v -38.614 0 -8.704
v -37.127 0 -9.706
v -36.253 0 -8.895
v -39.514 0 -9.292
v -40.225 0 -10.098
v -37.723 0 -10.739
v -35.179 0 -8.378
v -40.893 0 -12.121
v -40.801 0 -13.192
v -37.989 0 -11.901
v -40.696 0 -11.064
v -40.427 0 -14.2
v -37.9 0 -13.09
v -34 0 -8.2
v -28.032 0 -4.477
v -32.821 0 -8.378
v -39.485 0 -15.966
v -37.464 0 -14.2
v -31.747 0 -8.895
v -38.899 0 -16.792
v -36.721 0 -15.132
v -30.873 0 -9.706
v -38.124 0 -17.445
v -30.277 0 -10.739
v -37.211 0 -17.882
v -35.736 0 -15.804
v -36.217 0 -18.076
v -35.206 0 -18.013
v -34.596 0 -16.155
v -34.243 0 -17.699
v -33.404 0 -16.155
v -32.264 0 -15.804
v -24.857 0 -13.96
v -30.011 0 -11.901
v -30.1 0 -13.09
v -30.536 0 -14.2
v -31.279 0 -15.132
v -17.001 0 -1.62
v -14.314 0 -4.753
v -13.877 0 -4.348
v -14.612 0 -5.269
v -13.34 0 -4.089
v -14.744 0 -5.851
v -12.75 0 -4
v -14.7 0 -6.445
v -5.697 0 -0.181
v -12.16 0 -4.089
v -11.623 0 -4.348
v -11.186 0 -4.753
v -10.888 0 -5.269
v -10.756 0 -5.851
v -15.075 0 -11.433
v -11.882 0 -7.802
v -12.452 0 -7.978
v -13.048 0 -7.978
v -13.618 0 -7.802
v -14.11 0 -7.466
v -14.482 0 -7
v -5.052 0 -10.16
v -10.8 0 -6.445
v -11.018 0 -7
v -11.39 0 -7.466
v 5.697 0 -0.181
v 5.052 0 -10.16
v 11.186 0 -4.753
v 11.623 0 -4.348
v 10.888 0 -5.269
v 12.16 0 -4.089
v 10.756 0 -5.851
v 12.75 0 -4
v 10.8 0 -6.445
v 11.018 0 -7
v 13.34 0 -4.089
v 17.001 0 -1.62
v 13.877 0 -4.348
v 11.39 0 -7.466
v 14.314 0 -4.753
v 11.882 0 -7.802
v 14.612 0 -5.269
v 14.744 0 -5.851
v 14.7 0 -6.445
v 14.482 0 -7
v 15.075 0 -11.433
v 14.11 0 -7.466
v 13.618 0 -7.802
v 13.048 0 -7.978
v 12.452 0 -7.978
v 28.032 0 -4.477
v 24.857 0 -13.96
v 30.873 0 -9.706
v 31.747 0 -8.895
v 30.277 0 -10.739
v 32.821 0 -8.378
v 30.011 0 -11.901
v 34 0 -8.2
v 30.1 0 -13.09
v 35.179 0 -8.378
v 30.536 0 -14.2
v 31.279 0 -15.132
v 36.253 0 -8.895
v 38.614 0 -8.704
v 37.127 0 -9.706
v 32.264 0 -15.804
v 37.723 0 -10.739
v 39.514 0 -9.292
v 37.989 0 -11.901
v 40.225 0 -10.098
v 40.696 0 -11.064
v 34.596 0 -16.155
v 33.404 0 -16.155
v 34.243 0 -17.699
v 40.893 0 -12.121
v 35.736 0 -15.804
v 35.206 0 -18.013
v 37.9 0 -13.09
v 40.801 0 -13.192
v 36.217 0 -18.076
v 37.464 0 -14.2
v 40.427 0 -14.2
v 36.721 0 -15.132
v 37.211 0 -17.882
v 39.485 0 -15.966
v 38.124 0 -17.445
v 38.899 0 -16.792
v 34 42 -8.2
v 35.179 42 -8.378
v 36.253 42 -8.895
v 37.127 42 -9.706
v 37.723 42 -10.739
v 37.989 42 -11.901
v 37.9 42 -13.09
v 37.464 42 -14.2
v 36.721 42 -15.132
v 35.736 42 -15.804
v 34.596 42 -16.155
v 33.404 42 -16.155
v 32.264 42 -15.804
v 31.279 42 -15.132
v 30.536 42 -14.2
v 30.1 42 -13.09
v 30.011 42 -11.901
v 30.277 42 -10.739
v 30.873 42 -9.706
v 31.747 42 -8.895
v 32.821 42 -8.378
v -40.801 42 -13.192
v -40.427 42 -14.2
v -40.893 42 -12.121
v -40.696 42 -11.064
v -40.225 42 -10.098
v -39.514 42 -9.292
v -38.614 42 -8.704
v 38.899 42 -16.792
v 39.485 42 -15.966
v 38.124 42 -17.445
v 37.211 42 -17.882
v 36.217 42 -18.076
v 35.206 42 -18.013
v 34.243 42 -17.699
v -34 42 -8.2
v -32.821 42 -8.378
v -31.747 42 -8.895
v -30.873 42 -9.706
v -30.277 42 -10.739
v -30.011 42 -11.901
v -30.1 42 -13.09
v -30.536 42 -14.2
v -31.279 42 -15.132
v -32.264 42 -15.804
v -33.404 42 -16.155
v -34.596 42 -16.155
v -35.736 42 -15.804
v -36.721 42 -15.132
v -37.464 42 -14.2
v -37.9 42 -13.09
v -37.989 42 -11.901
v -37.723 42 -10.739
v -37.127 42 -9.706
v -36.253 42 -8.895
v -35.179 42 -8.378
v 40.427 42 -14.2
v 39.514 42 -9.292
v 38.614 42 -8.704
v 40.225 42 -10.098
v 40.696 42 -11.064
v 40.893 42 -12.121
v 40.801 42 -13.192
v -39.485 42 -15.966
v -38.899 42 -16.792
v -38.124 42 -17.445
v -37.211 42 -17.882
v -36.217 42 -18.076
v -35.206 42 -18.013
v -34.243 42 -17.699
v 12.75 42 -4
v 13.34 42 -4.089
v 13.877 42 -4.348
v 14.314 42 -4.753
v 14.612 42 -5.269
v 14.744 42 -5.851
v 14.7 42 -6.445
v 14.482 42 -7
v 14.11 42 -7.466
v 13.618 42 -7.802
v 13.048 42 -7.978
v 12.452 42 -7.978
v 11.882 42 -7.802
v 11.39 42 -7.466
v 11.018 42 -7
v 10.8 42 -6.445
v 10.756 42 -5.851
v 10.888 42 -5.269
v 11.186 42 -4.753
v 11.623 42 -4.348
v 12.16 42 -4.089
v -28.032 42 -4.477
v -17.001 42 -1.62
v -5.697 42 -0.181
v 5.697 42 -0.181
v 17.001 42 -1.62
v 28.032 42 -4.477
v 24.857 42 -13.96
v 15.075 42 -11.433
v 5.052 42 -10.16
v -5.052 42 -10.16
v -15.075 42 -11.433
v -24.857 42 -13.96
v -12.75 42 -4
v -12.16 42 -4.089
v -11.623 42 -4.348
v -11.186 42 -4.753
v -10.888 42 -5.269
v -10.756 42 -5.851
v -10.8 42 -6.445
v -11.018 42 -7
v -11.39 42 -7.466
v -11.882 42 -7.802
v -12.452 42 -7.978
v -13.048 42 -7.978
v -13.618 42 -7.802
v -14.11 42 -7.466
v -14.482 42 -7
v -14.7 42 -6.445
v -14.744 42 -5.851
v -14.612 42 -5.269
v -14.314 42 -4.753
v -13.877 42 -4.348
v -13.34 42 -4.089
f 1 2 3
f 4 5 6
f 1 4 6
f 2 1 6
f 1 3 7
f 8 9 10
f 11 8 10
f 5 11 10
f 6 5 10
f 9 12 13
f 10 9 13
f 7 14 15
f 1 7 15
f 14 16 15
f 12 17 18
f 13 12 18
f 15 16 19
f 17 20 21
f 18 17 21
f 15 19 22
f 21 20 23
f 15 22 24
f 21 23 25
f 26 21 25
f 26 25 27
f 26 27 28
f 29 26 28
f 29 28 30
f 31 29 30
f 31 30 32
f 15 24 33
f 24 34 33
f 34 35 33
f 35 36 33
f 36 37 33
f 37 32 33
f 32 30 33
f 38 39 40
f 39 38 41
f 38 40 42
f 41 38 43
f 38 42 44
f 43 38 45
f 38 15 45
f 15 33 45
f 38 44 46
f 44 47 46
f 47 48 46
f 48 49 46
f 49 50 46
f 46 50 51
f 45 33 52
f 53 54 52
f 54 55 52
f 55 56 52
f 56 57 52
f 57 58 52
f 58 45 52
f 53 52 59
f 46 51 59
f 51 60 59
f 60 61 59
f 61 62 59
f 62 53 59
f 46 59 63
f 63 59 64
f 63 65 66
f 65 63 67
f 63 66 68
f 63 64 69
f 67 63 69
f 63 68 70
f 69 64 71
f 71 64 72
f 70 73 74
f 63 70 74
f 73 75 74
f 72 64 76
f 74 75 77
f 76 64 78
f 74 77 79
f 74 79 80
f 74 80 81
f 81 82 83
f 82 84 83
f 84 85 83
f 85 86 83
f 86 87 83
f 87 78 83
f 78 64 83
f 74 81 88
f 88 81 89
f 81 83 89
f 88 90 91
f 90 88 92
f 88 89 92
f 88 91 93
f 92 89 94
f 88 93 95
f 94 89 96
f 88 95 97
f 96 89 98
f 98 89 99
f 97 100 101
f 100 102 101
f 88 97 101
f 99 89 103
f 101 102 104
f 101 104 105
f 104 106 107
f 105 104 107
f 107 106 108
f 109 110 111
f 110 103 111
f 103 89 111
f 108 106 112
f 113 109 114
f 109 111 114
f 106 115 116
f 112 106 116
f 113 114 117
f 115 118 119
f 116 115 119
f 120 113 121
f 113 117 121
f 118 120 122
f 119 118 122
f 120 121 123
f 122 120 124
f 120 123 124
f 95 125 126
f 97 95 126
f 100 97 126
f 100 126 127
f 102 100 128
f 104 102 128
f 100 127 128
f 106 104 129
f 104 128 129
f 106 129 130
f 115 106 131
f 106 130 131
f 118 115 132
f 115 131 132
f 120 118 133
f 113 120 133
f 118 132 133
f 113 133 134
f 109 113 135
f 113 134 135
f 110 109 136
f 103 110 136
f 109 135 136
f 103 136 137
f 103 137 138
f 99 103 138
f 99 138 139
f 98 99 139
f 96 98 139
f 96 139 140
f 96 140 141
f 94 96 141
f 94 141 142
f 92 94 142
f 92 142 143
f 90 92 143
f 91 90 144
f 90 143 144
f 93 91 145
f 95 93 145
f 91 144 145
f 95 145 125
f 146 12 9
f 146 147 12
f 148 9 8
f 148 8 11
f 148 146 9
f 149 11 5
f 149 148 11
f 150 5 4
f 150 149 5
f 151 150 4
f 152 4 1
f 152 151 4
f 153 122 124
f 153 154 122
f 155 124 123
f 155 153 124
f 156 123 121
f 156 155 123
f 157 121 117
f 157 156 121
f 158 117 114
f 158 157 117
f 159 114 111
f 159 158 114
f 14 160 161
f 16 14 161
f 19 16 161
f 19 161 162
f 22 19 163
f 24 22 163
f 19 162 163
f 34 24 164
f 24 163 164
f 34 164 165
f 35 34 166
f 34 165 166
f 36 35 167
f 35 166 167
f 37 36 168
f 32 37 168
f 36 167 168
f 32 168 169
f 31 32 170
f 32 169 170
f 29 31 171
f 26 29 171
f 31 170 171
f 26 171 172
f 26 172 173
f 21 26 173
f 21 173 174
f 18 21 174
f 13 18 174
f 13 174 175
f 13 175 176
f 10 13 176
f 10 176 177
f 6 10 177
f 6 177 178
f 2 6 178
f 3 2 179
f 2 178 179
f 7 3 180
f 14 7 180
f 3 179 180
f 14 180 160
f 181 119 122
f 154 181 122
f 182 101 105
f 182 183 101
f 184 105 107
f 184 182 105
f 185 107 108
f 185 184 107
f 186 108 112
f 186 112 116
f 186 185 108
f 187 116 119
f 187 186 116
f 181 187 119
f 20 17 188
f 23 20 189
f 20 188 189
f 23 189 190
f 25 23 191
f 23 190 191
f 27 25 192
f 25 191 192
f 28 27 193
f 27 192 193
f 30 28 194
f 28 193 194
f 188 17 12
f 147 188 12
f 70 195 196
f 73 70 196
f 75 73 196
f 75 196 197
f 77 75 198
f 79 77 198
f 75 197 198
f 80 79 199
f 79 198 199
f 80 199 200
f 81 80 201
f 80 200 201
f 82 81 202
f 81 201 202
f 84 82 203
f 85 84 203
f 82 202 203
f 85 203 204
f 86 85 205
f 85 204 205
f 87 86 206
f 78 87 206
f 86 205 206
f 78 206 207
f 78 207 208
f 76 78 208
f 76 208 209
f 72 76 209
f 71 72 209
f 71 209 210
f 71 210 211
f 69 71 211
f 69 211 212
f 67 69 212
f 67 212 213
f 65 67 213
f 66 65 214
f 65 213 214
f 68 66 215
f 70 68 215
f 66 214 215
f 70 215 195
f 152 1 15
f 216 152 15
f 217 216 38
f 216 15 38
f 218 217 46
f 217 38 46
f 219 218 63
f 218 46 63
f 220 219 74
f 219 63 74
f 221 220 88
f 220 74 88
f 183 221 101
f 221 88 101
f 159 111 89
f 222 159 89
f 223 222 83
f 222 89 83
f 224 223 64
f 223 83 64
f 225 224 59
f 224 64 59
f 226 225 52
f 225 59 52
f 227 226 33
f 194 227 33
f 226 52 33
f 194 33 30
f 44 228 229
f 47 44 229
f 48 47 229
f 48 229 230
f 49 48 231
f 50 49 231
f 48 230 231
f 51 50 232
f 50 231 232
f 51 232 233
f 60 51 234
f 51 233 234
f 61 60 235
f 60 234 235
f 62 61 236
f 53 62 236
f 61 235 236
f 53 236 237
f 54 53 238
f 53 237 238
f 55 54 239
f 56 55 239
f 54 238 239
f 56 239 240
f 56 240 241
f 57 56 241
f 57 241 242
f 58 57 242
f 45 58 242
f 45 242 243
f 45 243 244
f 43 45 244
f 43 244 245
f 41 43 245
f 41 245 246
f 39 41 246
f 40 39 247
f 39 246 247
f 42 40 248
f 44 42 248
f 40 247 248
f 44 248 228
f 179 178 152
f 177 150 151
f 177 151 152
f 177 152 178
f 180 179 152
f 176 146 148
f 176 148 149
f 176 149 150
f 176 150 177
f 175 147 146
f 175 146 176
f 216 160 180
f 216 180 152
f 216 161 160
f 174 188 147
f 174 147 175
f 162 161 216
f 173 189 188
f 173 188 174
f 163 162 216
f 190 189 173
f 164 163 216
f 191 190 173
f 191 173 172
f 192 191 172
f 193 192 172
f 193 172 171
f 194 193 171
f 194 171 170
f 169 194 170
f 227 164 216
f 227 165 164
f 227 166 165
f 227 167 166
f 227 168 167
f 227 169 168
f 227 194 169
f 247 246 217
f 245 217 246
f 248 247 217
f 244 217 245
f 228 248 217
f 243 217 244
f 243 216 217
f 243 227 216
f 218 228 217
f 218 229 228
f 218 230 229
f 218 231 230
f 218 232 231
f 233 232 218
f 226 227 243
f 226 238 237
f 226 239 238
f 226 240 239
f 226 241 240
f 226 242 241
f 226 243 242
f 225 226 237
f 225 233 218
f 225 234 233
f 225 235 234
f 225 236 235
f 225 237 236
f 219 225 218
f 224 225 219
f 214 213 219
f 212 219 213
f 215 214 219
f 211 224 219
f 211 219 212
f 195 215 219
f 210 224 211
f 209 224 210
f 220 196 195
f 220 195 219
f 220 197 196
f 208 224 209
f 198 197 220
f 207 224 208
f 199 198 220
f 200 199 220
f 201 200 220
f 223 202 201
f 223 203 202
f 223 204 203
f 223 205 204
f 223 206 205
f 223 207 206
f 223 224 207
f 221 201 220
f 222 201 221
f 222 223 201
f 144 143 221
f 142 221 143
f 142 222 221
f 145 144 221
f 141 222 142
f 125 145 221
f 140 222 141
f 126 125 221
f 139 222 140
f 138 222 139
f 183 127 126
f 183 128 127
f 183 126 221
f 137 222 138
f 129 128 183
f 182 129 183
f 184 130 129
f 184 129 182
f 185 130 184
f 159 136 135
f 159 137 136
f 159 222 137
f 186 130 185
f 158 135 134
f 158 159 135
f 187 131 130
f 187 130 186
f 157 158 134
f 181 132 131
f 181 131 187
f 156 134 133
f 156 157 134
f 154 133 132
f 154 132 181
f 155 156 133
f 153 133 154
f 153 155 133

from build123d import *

# Parameters (mm, degrees)
BOSS_EXTRUDE1_DEPTH = 42
FILLET1_R           = 4
SKETCH2_R           = 4
CUT_EXTRUDE1_DEPTH  = 42
SKETCH3_R           = 2
CUT_EXTRUDE2_DEPTH  = 42


with BuildPart() as part:
    # Sketch1 → Boss-Extrude1 (new body)
    with BuildSketch(Plane(origin=(0, 0, 0), x_dir=(1, 0, 0), z_dir=(0, 1, 0))):
        with BuildLine():
            Line((-37.647058824, 19.411764706), (-42.352941176, 10.588235294))
            ThreePointArc((-42.352941176, 10.588235294), (0, 0), (42.352941176, 10.588235294))
            Line((42.352941176, 10.588235294), (37.647058824, 19.411764706))
            ThreePointArc((37.647058824, 19.411764706), (0, 10), (-37.647058824, 19.411764706))
        make_face()
    extrude(amount=BOSS_EXTRUDE1_DEPTH)

    # Fillet1
    fillet1_edges = [part.edges().sort_by_distance(p)[0] for p in [
        (37.647058824, 21, -19.411764706),
        (42.352941176, 21, -10.588235294),
        (-42.352941176, 21, -10.588235294),
        (-37.647058824, 21, -19.411764706),
    ]]
    fillet(fillet1_edges, radius=FILLET1_R)

    # Sketch2 → Cut-Extrude1 (cut)
    with BuildSketch(Plane(origin=(0, 42, 0), x_dir=(1, 0, 0), z_dir=(0, 1, 0))):
        with Locations(Location((-34, 12.2, 0), (0, 0, 270))):
            Circle(SKETCH2_R)
        with Locations(Location((34, 12.2, 0), (0, 0, 270))):
            Circle(SKETCH2_R)
    extrude(amount=-CUT_EXTRUDE1_DEPTH, mode=Mode.SUBTRACT)

    # Sketch3 → Cut-Extrude2 (cut)
    with BuildSketch(Plane(origin=(0, 42, 0), x_dir=(1, 0, 0), z_dir=(0, 1, 0))):
        with Locations(Location((-12.75, 6, 0), (0, 0, 270))):
            Circle(SKETCH3_R)
        with Locations(Location((12.75, 6, 0), (0, 0, 270))):
            Circle(SKETCH3_R)
    extrude(amount=-CUT_EXTRUDE2_DEPTH, mode=Mode.SUBTRACT)


solid = part.part
